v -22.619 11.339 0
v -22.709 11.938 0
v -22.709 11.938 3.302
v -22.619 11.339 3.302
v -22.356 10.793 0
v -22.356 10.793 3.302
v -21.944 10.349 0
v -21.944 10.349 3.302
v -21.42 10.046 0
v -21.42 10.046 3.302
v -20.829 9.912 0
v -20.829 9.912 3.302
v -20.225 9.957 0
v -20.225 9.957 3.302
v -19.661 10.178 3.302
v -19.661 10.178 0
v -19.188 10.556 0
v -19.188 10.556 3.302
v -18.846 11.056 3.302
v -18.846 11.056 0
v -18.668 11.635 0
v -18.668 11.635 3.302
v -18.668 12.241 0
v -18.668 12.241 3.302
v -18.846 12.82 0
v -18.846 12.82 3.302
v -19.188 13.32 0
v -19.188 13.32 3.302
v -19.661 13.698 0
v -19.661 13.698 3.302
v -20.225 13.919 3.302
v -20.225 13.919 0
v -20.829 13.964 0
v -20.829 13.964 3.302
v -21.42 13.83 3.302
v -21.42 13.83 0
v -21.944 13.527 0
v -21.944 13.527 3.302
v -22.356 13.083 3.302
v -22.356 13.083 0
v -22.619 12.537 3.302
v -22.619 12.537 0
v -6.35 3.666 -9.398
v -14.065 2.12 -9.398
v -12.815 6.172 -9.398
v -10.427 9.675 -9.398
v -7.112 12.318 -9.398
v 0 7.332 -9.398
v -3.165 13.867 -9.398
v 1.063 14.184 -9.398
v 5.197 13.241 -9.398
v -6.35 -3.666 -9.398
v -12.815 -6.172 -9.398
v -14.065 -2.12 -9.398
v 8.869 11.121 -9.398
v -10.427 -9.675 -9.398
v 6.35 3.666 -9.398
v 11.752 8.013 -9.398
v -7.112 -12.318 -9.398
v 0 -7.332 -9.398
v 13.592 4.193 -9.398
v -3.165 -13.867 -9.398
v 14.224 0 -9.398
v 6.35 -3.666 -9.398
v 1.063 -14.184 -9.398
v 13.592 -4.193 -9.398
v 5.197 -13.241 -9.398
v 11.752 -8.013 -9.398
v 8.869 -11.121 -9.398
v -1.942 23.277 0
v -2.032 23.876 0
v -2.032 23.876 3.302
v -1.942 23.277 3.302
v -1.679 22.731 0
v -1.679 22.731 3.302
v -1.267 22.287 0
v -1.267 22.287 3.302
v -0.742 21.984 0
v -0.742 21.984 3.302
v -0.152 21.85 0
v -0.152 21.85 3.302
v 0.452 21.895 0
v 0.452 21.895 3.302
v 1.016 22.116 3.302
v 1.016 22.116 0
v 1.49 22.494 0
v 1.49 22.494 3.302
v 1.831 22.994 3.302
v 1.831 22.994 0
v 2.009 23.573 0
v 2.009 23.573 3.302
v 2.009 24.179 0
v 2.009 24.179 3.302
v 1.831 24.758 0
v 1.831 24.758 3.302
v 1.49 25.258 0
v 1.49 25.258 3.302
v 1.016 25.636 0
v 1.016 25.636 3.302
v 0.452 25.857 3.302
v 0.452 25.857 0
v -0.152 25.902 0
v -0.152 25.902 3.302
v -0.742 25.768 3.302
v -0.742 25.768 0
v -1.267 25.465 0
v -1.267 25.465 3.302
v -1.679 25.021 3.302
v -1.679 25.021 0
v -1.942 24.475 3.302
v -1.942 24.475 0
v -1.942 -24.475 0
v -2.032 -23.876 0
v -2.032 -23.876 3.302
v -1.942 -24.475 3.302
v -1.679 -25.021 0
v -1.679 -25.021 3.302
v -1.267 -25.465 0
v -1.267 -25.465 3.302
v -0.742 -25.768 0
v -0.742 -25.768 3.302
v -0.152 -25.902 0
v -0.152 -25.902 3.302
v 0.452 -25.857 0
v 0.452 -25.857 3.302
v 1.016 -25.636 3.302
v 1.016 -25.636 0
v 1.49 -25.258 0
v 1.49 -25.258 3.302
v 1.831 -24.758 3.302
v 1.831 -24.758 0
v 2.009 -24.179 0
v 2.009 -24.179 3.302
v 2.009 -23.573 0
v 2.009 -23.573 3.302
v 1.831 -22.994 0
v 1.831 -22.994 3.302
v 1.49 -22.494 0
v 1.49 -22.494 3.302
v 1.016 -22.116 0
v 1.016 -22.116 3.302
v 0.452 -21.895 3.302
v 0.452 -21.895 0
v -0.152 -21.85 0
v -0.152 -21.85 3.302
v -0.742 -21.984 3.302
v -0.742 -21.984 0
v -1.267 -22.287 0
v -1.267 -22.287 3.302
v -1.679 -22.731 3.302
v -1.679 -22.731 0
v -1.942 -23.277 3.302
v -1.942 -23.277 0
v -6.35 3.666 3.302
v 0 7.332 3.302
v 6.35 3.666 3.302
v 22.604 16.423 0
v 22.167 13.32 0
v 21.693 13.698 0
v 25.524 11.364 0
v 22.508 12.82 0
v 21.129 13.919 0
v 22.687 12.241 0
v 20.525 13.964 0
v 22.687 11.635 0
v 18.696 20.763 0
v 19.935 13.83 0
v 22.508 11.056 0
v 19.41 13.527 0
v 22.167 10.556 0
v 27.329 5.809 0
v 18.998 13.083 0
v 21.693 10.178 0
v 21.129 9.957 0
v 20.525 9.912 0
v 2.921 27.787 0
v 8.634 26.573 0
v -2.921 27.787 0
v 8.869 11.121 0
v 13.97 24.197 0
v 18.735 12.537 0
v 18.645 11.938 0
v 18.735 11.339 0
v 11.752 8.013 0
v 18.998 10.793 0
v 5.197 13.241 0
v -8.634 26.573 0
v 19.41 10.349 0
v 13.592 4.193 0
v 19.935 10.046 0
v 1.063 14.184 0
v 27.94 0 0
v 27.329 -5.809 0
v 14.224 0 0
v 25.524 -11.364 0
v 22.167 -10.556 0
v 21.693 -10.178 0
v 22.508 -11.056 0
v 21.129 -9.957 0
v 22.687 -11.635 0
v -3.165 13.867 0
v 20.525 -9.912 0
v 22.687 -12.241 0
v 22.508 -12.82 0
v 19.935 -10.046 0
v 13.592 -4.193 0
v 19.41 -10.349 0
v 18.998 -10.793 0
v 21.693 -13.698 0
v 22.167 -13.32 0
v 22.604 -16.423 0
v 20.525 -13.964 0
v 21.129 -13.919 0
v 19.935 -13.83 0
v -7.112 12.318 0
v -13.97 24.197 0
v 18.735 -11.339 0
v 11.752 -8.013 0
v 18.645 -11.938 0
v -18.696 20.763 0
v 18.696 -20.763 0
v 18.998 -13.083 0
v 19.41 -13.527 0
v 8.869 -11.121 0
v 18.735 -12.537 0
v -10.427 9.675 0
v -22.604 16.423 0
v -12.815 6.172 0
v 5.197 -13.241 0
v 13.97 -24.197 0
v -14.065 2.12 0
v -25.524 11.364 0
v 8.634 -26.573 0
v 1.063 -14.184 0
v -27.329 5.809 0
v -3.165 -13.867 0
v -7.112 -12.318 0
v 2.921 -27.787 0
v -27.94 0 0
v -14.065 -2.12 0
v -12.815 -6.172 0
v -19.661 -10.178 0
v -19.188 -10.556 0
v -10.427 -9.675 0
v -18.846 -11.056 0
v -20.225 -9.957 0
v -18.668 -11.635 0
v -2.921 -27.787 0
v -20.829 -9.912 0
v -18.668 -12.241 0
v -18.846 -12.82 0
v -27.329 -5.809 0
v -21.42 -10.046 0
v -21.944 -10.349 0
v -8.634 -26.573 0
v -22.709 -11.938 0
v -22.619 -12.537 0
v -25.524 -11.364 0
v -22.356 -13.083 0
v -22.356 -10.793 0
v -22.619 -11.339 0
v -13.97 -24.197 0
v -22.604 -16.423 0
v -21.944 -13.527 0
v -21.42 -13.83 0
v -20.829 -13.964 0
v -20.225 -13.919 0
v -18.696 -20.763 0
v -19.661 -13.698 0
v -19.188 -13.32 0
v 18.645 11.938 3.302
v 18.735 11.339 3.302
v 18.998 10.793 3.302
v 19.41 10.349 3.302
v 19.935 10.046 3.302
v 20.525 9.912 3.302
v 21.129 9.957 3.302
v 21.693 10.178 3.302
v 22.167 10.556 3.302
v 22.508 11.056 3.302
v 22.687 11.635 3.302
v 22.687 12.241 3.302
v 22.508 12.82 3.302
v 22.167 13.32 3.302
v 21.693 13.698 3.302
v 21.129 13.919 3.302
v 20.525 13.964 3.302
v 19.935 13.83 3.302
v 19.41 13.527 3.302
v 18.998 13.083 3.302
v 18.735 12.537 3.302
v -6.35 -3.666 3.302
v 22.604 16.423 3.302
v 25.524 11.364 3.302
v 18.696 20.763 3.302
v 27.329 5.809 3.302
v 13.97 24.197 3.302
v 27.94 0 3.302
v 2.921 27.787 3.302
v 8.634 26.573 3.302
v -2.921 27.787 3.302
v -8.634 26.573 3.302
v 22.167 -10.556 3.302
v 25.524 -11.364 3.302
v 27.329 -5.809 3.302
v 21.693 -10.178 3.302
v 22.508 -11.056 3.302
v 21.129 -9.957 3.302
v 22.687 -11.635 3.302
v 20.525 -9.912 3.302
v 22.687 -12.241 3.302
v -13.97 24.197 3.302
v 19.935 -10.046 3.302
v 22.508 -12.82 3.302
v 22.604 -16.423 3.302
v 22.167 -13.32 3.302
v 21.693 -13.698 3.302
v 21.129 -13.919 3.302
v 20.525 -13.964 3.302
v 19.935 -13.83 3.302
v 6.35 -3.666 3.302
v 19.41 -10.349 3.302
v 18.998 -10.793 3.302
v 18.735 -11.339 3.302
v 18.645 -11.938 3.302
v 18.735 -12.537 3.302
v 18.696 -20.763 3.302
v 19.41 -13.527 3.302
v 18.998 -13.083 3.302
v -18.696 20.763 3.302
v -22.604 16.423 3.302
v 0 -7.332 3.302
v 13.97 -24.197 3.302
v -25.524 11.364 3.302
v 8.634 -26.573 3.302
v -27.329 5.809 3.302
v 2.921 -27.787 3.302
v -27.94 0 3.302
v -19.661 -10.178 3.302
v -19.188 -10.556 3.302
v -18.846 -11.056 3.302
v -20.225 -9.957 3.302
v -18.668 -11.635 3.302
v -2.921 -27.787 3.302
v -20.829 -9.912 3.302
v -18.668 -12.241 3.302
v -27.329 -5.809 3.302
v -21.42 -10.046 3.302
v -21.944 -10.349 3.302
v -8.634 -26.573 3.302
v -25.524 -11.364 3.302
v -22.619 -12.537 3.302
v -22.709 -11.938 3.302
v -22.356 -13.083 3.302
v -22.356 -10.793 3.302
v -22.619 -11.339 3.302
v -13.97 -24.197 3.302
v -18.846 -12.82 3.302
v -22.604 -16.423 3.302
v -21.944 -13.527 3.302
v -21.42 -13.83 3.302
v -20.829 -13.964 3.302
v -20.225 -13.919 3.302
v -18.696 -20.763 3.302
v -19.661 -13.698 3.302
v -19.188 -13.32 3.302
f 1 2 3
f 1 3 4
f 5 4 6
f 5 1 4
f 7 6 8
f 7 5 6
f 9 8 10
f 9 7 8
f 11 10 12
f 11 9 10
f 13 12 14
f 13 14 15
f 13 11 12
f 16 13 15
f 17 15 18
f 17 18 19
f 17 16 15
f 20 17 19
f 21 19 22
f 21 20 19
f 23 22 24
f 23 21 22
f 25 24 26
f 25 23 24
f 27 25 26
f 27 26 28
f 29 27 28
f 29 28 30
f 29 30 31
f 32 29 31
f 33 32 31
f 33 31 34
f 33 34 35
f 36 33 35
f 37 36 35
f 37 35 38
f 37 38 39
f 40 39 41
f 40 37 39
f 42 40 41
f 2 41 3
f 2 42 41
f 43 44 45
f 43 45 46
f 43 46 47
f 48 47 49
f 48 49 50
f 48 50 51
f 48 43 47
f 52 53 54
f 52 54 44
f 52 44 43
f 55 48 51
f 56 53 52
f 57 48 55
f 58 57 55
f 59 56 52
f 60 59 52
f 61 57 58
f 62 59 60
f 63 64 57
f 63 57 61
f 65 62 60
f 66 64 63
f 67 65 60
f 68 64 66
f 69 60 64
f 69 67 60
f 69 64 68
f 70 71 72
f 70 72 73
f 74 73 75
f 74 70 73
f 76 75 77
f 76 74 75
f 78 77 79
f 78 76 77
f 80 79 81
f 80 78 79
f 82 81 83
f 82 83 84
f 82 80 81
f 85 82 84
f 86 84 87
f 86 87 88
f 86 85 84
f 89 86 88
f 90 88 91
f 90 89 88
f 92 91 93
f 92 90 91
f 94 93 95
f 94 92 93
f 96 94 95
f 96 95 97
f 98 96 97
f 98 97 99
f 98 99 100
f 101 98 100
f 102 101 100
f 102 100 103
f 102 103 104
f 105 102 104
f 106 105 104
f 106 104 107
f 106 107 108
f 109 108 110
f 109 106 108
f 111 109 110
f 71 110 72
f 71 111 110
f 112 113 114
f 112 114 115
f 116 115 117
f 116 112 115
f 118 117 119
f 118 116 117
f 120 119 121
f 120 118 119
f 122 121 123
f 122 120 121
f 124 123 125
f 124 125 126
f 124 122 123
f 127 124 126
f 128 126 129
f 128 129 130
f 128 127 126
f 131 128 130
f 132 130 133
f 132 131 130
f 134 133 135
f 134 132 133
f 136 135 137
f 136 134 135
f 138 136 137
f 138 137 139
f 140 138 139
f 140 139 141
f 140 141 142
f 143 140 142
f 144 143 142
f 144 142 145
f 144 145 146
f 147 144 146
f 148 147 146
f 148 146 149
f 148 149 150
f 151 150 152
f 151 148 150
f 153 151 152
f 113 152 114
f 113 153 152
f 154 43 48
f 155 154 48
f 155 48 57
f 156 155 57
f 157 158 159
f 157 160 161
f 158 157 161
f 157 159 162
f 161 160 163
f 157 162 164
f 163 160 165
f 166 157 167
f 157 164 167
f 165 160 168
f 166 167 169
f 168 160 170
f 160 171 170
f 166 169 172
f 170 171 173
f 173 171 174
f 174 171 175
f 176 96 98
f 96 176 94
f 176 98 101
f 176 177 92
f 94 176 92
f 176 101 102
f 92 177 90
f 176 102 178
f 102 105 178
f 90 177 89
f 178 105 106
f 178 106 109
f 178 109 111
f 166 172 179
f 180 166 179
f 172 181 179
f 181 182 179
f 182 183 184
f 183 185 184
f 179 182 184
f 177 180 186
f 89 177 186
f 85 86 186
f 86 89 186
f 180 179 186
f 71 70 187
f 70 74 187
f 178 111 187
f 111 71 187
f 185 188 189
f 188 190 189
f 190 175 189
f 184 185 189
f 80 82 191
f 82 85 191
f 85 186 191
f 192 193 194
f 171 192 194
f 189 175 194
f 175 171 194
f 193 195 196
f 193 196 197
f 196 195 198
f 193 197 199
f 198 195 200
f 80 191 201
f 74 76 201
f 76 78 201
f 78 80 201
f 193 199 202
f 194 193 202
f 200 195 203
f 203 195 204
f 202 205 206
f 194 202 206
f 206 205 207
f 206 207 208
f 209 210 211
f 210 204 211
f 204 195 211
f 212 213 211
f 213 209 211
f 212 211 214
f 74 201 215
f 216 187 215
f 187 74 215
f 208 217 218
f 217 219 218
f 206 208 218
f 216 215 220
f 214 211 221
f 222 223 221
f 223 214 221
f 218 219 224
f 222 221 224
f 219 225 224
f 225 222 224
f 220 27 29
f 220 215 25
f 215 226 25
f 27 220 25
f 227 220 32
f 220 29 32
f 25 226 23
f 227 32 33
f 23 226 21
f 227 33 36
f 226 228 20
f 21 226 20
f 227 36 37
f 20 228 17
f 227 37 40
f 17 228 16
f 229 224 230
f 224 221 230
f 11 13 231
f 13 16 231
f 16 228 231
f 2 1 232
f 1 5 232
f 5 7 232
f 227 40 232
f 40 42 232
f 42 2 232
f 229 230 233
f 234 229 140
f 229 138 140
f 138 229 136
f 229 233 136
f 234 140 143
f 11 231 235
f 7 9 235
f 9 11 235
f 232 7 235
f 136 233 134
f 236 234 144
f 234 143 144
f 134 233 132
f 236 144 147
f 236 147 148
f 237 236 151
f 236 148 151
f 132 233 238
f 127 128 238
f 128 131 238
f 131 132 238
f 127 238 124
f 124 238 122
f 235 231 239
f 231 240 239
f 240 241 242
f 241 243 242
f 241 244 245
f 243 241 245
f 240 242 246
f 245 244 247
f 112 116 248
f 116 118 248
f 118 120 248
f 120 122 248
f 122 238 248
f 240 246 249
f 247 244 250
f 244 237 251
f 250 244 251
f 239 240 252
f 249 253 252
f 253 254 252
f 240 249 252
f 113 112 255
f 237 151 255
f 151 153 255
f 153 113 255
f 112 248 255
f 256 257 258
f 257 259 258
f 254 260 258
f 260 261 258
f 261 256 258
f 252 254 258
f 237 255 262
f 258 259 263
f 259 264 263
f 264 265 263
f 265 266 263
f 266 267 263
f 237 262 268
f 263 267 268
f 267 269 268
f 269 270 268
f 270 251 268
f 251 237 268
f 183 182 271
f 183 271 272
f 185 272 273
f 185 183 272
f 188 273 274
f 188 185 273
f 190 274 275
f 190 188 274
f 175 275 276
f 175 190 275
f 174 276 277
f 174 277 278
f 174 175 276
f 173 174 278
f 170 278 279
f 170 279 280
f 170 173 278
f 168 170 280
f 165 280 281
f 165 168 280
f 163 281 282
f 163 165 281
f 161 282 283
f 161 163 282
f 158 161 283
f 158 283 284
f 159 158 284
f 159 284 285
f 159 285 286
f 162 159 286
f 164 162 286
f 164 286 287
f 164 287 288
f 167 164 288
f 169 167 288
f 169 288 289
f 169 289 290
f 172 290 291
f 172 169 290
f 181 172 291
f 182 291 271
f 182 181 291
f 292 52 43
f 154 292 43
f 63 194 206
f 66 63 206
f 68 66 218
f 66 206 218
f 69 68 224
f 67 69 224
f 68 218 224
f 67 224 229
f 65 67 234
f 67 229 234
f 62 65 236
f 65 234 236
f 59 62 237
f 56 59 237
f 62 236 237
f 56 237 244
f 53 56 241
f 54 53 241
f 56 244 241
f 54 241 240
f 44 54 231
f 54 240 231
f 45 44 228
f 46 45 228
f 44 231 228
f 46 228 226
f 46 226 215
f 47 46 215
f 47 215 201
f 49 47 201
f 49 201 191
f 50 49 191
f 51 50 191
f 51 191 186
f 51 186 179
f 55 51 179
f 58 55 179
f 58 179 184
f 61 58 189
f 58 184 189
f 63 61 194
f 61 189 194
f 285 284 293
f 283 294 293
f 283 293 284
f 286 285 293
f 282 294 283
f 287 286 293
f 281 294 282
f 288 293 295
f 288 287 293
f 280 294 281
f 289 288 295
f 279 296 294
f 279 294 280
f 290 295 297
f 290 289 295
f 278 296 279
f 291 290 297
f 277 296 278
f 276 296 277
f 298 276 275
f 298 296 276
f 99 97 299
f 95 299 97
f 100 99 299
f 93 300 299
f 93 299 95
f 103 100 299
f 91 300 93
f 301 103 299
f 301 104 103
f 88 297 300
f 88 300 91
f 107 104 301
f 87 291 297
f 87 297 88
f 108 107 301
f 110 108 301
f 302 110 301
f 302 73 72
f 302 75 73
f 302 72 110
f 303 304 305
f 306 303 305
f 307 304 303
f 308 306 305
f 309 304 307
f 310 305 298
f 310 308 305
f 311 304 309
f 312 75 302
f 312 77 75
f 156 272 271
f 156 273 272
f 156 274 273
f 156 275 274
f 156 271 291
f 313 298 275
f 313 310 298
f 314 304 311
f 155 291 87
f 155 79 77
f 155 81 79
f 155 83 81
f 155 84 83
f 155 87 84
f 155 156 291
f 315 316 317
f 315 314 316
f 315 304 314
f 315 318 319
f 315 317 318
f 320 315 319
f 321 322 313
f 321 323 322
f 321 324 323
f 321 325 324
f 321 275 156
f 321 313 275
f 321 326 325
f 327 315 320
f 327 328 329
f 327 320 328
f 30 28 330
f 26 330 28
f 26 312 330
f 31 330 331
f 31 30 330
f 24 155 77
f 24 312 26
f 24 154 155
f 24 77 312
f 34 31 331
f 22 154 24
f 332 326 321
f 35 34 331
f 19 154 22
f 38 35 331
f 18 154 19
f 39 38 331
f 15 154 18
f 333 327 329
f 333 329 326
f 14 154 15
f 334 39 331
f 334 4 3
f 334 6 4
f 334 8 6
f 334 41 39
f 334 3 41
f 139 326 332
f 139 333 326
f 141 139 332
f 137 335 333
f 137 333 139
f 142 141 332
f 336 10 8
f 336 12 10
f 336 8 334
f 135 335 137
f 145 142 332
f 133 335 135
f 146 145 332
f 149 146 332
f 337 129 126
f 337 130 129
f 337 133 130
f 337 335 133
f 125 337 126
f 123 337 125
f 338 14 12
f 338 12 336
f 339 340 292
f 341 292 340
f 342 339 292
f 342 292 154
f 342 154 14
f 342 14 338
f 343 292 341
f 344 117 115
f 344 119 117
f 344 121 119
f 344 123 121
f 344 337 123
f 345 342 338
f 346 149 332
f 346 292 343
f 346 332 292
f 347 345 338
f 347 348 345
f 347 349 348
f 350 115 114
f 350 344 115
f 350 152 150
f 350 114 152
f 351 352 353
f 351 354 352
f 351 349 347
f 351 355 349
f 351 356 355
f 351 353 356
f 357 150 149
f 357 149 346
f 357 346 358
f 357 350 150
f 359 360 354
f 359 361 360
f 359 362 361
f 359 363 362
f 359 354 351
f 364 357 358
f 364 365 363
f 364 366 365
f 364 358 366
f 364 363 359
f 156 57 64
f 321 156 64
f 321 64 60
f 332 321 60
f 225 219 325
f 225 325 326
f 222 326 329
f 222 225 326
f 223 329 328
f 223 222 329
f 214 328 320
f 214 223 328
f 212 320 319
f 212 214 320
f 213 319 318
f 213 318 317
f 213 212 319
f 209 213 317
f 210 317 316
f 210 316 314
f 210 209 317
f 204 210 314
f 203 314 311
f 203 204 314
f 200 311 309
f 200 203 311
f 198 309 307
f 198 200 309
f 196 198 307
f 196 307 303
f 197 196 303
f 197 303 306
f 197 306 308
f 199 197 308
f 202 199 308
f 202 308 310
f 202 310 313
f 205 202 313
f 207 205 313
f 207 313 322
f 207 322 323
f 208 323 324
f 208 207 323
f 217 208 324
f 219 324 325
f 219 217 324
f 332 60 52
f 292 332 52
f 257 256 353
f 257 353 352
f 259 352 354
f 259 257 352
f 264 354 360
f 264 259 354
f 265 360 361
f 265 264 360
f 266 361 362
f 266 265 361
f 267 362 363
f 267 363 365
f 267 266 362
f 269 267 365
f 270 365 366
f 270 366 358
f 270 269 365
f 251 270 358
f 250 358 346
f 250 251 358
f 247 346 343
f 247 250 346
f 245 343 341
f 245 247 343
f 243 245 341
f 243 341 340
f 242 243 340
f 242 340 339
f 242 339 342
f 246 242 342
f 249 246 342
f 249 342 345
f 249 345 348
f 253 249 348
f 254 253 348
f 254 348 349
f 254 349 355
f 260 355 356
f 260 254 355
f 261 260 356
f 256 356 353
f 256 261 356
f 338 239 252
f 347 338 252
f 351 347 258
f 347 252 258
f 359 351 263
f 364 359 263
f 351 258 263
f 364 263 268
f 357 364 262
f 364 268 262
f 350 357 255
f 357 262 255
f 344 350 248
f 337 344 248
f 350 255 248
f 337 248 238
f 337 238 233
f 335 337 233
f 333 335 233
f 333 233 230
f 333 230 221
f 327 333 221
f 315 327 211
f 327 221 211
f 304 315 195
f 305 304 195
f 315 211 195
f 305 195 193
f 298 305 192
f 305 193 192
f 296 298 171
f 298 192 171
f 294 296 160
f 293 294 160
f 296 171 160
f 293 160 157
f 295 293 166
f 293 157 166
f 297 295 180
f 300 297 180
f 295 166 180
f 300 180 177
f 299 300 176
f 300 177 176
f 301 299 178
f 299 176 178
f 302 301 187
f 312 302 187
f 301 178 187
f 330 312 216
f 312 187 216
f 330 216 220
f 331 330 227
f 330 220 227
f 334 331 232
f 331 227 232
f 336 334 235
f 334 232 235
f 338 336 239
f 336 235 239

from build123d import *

# Parameters (mm, degrees)
SKETCH1_R           = 27.94
SKETCH1_R_2         = 2.032
BOSS_EXTRUDE1_DEPTH = 3.302
SKETCH2_R           = 14.224
BOSS_EXTRUDE2_DEPTH = 9.398
CUT_EXTRUDE1_DEPTH  = 12.7


with BuildPart() as part:
    # Sketch1 → Boss-Extrude1 (new body)
    with BuildSketch(Plane.XY):
        with Locations(Location((0, 0, 0), (0, 0, 180))):
            Circle(SKETCH1_R)
        with Locations(Location((0, 23.876, 0), (0, 0, 180))):
            Circle(SKETCH1_R_2, mode=Mode.SUBTRACT)
        with Locations(Location((20.677222541, 11.938, 0), (0, 0, 180))):
            Circle(SKETCH1_R_2, mode=Mode.SUBTRACT)
        with Locations(Location((20.677222541, -11.938, 0), (0, 0, 180))):
            Circle(SKETCH1_R_2, mode=Mode.SUBTRACT)
        with Locations(Location((0, -23.876, 0), (0, 0, 180))):
            Circle(SKETCH1_R_2, mode=Mode.SUBTRACT)
        with Locations(Location((-20.677222541, -11.938, 0), (0, 0, 180))):
            Circle(SKETCH1_R_2, mode=Mode.SUBTRACT)
        with Locations(Location((-20.677222541, 11.938, 0), (0, 0, 180))):
            Circle(SKETCH1_R_2, mode=Mode.SUBTRACT)
    extrude(amount=BOSS_EXTRUDE1_DEPTH)

    # Sketch2 → Boss-Extrude2 (add)
    with BuildSketch(Plane(origin=(0, 0, 0), x_dir=(-1, 0, 0), z_dir=(0, 0, -1))):
        with Locations(Location((0, 0, 0), (0, 0, 180))):
            Circle(SKETCH2_R)
    extrude(amount=BOSS_EXTRUDE2_DEPTH)

    # Sketch3 → Cut-Extrude1 (cut)
    with BuildSketch(Plane(origin=(0, 0, -9.398), x_dir=(-1, 0, 0), z_dir=(0, 0, -1))):
        Polygon((0, 7.332348419), (-6.35, 3.666174209), (-6.35, -3.666174209), (0, -7.332348419), (6.35, -3.666174209), (6.35, 3.666174209), align=None)
    extrude(amount=-CUT_EXTRUDE1_DEPTH, mode=Mode.SUBTRACT)


solid = part.part
